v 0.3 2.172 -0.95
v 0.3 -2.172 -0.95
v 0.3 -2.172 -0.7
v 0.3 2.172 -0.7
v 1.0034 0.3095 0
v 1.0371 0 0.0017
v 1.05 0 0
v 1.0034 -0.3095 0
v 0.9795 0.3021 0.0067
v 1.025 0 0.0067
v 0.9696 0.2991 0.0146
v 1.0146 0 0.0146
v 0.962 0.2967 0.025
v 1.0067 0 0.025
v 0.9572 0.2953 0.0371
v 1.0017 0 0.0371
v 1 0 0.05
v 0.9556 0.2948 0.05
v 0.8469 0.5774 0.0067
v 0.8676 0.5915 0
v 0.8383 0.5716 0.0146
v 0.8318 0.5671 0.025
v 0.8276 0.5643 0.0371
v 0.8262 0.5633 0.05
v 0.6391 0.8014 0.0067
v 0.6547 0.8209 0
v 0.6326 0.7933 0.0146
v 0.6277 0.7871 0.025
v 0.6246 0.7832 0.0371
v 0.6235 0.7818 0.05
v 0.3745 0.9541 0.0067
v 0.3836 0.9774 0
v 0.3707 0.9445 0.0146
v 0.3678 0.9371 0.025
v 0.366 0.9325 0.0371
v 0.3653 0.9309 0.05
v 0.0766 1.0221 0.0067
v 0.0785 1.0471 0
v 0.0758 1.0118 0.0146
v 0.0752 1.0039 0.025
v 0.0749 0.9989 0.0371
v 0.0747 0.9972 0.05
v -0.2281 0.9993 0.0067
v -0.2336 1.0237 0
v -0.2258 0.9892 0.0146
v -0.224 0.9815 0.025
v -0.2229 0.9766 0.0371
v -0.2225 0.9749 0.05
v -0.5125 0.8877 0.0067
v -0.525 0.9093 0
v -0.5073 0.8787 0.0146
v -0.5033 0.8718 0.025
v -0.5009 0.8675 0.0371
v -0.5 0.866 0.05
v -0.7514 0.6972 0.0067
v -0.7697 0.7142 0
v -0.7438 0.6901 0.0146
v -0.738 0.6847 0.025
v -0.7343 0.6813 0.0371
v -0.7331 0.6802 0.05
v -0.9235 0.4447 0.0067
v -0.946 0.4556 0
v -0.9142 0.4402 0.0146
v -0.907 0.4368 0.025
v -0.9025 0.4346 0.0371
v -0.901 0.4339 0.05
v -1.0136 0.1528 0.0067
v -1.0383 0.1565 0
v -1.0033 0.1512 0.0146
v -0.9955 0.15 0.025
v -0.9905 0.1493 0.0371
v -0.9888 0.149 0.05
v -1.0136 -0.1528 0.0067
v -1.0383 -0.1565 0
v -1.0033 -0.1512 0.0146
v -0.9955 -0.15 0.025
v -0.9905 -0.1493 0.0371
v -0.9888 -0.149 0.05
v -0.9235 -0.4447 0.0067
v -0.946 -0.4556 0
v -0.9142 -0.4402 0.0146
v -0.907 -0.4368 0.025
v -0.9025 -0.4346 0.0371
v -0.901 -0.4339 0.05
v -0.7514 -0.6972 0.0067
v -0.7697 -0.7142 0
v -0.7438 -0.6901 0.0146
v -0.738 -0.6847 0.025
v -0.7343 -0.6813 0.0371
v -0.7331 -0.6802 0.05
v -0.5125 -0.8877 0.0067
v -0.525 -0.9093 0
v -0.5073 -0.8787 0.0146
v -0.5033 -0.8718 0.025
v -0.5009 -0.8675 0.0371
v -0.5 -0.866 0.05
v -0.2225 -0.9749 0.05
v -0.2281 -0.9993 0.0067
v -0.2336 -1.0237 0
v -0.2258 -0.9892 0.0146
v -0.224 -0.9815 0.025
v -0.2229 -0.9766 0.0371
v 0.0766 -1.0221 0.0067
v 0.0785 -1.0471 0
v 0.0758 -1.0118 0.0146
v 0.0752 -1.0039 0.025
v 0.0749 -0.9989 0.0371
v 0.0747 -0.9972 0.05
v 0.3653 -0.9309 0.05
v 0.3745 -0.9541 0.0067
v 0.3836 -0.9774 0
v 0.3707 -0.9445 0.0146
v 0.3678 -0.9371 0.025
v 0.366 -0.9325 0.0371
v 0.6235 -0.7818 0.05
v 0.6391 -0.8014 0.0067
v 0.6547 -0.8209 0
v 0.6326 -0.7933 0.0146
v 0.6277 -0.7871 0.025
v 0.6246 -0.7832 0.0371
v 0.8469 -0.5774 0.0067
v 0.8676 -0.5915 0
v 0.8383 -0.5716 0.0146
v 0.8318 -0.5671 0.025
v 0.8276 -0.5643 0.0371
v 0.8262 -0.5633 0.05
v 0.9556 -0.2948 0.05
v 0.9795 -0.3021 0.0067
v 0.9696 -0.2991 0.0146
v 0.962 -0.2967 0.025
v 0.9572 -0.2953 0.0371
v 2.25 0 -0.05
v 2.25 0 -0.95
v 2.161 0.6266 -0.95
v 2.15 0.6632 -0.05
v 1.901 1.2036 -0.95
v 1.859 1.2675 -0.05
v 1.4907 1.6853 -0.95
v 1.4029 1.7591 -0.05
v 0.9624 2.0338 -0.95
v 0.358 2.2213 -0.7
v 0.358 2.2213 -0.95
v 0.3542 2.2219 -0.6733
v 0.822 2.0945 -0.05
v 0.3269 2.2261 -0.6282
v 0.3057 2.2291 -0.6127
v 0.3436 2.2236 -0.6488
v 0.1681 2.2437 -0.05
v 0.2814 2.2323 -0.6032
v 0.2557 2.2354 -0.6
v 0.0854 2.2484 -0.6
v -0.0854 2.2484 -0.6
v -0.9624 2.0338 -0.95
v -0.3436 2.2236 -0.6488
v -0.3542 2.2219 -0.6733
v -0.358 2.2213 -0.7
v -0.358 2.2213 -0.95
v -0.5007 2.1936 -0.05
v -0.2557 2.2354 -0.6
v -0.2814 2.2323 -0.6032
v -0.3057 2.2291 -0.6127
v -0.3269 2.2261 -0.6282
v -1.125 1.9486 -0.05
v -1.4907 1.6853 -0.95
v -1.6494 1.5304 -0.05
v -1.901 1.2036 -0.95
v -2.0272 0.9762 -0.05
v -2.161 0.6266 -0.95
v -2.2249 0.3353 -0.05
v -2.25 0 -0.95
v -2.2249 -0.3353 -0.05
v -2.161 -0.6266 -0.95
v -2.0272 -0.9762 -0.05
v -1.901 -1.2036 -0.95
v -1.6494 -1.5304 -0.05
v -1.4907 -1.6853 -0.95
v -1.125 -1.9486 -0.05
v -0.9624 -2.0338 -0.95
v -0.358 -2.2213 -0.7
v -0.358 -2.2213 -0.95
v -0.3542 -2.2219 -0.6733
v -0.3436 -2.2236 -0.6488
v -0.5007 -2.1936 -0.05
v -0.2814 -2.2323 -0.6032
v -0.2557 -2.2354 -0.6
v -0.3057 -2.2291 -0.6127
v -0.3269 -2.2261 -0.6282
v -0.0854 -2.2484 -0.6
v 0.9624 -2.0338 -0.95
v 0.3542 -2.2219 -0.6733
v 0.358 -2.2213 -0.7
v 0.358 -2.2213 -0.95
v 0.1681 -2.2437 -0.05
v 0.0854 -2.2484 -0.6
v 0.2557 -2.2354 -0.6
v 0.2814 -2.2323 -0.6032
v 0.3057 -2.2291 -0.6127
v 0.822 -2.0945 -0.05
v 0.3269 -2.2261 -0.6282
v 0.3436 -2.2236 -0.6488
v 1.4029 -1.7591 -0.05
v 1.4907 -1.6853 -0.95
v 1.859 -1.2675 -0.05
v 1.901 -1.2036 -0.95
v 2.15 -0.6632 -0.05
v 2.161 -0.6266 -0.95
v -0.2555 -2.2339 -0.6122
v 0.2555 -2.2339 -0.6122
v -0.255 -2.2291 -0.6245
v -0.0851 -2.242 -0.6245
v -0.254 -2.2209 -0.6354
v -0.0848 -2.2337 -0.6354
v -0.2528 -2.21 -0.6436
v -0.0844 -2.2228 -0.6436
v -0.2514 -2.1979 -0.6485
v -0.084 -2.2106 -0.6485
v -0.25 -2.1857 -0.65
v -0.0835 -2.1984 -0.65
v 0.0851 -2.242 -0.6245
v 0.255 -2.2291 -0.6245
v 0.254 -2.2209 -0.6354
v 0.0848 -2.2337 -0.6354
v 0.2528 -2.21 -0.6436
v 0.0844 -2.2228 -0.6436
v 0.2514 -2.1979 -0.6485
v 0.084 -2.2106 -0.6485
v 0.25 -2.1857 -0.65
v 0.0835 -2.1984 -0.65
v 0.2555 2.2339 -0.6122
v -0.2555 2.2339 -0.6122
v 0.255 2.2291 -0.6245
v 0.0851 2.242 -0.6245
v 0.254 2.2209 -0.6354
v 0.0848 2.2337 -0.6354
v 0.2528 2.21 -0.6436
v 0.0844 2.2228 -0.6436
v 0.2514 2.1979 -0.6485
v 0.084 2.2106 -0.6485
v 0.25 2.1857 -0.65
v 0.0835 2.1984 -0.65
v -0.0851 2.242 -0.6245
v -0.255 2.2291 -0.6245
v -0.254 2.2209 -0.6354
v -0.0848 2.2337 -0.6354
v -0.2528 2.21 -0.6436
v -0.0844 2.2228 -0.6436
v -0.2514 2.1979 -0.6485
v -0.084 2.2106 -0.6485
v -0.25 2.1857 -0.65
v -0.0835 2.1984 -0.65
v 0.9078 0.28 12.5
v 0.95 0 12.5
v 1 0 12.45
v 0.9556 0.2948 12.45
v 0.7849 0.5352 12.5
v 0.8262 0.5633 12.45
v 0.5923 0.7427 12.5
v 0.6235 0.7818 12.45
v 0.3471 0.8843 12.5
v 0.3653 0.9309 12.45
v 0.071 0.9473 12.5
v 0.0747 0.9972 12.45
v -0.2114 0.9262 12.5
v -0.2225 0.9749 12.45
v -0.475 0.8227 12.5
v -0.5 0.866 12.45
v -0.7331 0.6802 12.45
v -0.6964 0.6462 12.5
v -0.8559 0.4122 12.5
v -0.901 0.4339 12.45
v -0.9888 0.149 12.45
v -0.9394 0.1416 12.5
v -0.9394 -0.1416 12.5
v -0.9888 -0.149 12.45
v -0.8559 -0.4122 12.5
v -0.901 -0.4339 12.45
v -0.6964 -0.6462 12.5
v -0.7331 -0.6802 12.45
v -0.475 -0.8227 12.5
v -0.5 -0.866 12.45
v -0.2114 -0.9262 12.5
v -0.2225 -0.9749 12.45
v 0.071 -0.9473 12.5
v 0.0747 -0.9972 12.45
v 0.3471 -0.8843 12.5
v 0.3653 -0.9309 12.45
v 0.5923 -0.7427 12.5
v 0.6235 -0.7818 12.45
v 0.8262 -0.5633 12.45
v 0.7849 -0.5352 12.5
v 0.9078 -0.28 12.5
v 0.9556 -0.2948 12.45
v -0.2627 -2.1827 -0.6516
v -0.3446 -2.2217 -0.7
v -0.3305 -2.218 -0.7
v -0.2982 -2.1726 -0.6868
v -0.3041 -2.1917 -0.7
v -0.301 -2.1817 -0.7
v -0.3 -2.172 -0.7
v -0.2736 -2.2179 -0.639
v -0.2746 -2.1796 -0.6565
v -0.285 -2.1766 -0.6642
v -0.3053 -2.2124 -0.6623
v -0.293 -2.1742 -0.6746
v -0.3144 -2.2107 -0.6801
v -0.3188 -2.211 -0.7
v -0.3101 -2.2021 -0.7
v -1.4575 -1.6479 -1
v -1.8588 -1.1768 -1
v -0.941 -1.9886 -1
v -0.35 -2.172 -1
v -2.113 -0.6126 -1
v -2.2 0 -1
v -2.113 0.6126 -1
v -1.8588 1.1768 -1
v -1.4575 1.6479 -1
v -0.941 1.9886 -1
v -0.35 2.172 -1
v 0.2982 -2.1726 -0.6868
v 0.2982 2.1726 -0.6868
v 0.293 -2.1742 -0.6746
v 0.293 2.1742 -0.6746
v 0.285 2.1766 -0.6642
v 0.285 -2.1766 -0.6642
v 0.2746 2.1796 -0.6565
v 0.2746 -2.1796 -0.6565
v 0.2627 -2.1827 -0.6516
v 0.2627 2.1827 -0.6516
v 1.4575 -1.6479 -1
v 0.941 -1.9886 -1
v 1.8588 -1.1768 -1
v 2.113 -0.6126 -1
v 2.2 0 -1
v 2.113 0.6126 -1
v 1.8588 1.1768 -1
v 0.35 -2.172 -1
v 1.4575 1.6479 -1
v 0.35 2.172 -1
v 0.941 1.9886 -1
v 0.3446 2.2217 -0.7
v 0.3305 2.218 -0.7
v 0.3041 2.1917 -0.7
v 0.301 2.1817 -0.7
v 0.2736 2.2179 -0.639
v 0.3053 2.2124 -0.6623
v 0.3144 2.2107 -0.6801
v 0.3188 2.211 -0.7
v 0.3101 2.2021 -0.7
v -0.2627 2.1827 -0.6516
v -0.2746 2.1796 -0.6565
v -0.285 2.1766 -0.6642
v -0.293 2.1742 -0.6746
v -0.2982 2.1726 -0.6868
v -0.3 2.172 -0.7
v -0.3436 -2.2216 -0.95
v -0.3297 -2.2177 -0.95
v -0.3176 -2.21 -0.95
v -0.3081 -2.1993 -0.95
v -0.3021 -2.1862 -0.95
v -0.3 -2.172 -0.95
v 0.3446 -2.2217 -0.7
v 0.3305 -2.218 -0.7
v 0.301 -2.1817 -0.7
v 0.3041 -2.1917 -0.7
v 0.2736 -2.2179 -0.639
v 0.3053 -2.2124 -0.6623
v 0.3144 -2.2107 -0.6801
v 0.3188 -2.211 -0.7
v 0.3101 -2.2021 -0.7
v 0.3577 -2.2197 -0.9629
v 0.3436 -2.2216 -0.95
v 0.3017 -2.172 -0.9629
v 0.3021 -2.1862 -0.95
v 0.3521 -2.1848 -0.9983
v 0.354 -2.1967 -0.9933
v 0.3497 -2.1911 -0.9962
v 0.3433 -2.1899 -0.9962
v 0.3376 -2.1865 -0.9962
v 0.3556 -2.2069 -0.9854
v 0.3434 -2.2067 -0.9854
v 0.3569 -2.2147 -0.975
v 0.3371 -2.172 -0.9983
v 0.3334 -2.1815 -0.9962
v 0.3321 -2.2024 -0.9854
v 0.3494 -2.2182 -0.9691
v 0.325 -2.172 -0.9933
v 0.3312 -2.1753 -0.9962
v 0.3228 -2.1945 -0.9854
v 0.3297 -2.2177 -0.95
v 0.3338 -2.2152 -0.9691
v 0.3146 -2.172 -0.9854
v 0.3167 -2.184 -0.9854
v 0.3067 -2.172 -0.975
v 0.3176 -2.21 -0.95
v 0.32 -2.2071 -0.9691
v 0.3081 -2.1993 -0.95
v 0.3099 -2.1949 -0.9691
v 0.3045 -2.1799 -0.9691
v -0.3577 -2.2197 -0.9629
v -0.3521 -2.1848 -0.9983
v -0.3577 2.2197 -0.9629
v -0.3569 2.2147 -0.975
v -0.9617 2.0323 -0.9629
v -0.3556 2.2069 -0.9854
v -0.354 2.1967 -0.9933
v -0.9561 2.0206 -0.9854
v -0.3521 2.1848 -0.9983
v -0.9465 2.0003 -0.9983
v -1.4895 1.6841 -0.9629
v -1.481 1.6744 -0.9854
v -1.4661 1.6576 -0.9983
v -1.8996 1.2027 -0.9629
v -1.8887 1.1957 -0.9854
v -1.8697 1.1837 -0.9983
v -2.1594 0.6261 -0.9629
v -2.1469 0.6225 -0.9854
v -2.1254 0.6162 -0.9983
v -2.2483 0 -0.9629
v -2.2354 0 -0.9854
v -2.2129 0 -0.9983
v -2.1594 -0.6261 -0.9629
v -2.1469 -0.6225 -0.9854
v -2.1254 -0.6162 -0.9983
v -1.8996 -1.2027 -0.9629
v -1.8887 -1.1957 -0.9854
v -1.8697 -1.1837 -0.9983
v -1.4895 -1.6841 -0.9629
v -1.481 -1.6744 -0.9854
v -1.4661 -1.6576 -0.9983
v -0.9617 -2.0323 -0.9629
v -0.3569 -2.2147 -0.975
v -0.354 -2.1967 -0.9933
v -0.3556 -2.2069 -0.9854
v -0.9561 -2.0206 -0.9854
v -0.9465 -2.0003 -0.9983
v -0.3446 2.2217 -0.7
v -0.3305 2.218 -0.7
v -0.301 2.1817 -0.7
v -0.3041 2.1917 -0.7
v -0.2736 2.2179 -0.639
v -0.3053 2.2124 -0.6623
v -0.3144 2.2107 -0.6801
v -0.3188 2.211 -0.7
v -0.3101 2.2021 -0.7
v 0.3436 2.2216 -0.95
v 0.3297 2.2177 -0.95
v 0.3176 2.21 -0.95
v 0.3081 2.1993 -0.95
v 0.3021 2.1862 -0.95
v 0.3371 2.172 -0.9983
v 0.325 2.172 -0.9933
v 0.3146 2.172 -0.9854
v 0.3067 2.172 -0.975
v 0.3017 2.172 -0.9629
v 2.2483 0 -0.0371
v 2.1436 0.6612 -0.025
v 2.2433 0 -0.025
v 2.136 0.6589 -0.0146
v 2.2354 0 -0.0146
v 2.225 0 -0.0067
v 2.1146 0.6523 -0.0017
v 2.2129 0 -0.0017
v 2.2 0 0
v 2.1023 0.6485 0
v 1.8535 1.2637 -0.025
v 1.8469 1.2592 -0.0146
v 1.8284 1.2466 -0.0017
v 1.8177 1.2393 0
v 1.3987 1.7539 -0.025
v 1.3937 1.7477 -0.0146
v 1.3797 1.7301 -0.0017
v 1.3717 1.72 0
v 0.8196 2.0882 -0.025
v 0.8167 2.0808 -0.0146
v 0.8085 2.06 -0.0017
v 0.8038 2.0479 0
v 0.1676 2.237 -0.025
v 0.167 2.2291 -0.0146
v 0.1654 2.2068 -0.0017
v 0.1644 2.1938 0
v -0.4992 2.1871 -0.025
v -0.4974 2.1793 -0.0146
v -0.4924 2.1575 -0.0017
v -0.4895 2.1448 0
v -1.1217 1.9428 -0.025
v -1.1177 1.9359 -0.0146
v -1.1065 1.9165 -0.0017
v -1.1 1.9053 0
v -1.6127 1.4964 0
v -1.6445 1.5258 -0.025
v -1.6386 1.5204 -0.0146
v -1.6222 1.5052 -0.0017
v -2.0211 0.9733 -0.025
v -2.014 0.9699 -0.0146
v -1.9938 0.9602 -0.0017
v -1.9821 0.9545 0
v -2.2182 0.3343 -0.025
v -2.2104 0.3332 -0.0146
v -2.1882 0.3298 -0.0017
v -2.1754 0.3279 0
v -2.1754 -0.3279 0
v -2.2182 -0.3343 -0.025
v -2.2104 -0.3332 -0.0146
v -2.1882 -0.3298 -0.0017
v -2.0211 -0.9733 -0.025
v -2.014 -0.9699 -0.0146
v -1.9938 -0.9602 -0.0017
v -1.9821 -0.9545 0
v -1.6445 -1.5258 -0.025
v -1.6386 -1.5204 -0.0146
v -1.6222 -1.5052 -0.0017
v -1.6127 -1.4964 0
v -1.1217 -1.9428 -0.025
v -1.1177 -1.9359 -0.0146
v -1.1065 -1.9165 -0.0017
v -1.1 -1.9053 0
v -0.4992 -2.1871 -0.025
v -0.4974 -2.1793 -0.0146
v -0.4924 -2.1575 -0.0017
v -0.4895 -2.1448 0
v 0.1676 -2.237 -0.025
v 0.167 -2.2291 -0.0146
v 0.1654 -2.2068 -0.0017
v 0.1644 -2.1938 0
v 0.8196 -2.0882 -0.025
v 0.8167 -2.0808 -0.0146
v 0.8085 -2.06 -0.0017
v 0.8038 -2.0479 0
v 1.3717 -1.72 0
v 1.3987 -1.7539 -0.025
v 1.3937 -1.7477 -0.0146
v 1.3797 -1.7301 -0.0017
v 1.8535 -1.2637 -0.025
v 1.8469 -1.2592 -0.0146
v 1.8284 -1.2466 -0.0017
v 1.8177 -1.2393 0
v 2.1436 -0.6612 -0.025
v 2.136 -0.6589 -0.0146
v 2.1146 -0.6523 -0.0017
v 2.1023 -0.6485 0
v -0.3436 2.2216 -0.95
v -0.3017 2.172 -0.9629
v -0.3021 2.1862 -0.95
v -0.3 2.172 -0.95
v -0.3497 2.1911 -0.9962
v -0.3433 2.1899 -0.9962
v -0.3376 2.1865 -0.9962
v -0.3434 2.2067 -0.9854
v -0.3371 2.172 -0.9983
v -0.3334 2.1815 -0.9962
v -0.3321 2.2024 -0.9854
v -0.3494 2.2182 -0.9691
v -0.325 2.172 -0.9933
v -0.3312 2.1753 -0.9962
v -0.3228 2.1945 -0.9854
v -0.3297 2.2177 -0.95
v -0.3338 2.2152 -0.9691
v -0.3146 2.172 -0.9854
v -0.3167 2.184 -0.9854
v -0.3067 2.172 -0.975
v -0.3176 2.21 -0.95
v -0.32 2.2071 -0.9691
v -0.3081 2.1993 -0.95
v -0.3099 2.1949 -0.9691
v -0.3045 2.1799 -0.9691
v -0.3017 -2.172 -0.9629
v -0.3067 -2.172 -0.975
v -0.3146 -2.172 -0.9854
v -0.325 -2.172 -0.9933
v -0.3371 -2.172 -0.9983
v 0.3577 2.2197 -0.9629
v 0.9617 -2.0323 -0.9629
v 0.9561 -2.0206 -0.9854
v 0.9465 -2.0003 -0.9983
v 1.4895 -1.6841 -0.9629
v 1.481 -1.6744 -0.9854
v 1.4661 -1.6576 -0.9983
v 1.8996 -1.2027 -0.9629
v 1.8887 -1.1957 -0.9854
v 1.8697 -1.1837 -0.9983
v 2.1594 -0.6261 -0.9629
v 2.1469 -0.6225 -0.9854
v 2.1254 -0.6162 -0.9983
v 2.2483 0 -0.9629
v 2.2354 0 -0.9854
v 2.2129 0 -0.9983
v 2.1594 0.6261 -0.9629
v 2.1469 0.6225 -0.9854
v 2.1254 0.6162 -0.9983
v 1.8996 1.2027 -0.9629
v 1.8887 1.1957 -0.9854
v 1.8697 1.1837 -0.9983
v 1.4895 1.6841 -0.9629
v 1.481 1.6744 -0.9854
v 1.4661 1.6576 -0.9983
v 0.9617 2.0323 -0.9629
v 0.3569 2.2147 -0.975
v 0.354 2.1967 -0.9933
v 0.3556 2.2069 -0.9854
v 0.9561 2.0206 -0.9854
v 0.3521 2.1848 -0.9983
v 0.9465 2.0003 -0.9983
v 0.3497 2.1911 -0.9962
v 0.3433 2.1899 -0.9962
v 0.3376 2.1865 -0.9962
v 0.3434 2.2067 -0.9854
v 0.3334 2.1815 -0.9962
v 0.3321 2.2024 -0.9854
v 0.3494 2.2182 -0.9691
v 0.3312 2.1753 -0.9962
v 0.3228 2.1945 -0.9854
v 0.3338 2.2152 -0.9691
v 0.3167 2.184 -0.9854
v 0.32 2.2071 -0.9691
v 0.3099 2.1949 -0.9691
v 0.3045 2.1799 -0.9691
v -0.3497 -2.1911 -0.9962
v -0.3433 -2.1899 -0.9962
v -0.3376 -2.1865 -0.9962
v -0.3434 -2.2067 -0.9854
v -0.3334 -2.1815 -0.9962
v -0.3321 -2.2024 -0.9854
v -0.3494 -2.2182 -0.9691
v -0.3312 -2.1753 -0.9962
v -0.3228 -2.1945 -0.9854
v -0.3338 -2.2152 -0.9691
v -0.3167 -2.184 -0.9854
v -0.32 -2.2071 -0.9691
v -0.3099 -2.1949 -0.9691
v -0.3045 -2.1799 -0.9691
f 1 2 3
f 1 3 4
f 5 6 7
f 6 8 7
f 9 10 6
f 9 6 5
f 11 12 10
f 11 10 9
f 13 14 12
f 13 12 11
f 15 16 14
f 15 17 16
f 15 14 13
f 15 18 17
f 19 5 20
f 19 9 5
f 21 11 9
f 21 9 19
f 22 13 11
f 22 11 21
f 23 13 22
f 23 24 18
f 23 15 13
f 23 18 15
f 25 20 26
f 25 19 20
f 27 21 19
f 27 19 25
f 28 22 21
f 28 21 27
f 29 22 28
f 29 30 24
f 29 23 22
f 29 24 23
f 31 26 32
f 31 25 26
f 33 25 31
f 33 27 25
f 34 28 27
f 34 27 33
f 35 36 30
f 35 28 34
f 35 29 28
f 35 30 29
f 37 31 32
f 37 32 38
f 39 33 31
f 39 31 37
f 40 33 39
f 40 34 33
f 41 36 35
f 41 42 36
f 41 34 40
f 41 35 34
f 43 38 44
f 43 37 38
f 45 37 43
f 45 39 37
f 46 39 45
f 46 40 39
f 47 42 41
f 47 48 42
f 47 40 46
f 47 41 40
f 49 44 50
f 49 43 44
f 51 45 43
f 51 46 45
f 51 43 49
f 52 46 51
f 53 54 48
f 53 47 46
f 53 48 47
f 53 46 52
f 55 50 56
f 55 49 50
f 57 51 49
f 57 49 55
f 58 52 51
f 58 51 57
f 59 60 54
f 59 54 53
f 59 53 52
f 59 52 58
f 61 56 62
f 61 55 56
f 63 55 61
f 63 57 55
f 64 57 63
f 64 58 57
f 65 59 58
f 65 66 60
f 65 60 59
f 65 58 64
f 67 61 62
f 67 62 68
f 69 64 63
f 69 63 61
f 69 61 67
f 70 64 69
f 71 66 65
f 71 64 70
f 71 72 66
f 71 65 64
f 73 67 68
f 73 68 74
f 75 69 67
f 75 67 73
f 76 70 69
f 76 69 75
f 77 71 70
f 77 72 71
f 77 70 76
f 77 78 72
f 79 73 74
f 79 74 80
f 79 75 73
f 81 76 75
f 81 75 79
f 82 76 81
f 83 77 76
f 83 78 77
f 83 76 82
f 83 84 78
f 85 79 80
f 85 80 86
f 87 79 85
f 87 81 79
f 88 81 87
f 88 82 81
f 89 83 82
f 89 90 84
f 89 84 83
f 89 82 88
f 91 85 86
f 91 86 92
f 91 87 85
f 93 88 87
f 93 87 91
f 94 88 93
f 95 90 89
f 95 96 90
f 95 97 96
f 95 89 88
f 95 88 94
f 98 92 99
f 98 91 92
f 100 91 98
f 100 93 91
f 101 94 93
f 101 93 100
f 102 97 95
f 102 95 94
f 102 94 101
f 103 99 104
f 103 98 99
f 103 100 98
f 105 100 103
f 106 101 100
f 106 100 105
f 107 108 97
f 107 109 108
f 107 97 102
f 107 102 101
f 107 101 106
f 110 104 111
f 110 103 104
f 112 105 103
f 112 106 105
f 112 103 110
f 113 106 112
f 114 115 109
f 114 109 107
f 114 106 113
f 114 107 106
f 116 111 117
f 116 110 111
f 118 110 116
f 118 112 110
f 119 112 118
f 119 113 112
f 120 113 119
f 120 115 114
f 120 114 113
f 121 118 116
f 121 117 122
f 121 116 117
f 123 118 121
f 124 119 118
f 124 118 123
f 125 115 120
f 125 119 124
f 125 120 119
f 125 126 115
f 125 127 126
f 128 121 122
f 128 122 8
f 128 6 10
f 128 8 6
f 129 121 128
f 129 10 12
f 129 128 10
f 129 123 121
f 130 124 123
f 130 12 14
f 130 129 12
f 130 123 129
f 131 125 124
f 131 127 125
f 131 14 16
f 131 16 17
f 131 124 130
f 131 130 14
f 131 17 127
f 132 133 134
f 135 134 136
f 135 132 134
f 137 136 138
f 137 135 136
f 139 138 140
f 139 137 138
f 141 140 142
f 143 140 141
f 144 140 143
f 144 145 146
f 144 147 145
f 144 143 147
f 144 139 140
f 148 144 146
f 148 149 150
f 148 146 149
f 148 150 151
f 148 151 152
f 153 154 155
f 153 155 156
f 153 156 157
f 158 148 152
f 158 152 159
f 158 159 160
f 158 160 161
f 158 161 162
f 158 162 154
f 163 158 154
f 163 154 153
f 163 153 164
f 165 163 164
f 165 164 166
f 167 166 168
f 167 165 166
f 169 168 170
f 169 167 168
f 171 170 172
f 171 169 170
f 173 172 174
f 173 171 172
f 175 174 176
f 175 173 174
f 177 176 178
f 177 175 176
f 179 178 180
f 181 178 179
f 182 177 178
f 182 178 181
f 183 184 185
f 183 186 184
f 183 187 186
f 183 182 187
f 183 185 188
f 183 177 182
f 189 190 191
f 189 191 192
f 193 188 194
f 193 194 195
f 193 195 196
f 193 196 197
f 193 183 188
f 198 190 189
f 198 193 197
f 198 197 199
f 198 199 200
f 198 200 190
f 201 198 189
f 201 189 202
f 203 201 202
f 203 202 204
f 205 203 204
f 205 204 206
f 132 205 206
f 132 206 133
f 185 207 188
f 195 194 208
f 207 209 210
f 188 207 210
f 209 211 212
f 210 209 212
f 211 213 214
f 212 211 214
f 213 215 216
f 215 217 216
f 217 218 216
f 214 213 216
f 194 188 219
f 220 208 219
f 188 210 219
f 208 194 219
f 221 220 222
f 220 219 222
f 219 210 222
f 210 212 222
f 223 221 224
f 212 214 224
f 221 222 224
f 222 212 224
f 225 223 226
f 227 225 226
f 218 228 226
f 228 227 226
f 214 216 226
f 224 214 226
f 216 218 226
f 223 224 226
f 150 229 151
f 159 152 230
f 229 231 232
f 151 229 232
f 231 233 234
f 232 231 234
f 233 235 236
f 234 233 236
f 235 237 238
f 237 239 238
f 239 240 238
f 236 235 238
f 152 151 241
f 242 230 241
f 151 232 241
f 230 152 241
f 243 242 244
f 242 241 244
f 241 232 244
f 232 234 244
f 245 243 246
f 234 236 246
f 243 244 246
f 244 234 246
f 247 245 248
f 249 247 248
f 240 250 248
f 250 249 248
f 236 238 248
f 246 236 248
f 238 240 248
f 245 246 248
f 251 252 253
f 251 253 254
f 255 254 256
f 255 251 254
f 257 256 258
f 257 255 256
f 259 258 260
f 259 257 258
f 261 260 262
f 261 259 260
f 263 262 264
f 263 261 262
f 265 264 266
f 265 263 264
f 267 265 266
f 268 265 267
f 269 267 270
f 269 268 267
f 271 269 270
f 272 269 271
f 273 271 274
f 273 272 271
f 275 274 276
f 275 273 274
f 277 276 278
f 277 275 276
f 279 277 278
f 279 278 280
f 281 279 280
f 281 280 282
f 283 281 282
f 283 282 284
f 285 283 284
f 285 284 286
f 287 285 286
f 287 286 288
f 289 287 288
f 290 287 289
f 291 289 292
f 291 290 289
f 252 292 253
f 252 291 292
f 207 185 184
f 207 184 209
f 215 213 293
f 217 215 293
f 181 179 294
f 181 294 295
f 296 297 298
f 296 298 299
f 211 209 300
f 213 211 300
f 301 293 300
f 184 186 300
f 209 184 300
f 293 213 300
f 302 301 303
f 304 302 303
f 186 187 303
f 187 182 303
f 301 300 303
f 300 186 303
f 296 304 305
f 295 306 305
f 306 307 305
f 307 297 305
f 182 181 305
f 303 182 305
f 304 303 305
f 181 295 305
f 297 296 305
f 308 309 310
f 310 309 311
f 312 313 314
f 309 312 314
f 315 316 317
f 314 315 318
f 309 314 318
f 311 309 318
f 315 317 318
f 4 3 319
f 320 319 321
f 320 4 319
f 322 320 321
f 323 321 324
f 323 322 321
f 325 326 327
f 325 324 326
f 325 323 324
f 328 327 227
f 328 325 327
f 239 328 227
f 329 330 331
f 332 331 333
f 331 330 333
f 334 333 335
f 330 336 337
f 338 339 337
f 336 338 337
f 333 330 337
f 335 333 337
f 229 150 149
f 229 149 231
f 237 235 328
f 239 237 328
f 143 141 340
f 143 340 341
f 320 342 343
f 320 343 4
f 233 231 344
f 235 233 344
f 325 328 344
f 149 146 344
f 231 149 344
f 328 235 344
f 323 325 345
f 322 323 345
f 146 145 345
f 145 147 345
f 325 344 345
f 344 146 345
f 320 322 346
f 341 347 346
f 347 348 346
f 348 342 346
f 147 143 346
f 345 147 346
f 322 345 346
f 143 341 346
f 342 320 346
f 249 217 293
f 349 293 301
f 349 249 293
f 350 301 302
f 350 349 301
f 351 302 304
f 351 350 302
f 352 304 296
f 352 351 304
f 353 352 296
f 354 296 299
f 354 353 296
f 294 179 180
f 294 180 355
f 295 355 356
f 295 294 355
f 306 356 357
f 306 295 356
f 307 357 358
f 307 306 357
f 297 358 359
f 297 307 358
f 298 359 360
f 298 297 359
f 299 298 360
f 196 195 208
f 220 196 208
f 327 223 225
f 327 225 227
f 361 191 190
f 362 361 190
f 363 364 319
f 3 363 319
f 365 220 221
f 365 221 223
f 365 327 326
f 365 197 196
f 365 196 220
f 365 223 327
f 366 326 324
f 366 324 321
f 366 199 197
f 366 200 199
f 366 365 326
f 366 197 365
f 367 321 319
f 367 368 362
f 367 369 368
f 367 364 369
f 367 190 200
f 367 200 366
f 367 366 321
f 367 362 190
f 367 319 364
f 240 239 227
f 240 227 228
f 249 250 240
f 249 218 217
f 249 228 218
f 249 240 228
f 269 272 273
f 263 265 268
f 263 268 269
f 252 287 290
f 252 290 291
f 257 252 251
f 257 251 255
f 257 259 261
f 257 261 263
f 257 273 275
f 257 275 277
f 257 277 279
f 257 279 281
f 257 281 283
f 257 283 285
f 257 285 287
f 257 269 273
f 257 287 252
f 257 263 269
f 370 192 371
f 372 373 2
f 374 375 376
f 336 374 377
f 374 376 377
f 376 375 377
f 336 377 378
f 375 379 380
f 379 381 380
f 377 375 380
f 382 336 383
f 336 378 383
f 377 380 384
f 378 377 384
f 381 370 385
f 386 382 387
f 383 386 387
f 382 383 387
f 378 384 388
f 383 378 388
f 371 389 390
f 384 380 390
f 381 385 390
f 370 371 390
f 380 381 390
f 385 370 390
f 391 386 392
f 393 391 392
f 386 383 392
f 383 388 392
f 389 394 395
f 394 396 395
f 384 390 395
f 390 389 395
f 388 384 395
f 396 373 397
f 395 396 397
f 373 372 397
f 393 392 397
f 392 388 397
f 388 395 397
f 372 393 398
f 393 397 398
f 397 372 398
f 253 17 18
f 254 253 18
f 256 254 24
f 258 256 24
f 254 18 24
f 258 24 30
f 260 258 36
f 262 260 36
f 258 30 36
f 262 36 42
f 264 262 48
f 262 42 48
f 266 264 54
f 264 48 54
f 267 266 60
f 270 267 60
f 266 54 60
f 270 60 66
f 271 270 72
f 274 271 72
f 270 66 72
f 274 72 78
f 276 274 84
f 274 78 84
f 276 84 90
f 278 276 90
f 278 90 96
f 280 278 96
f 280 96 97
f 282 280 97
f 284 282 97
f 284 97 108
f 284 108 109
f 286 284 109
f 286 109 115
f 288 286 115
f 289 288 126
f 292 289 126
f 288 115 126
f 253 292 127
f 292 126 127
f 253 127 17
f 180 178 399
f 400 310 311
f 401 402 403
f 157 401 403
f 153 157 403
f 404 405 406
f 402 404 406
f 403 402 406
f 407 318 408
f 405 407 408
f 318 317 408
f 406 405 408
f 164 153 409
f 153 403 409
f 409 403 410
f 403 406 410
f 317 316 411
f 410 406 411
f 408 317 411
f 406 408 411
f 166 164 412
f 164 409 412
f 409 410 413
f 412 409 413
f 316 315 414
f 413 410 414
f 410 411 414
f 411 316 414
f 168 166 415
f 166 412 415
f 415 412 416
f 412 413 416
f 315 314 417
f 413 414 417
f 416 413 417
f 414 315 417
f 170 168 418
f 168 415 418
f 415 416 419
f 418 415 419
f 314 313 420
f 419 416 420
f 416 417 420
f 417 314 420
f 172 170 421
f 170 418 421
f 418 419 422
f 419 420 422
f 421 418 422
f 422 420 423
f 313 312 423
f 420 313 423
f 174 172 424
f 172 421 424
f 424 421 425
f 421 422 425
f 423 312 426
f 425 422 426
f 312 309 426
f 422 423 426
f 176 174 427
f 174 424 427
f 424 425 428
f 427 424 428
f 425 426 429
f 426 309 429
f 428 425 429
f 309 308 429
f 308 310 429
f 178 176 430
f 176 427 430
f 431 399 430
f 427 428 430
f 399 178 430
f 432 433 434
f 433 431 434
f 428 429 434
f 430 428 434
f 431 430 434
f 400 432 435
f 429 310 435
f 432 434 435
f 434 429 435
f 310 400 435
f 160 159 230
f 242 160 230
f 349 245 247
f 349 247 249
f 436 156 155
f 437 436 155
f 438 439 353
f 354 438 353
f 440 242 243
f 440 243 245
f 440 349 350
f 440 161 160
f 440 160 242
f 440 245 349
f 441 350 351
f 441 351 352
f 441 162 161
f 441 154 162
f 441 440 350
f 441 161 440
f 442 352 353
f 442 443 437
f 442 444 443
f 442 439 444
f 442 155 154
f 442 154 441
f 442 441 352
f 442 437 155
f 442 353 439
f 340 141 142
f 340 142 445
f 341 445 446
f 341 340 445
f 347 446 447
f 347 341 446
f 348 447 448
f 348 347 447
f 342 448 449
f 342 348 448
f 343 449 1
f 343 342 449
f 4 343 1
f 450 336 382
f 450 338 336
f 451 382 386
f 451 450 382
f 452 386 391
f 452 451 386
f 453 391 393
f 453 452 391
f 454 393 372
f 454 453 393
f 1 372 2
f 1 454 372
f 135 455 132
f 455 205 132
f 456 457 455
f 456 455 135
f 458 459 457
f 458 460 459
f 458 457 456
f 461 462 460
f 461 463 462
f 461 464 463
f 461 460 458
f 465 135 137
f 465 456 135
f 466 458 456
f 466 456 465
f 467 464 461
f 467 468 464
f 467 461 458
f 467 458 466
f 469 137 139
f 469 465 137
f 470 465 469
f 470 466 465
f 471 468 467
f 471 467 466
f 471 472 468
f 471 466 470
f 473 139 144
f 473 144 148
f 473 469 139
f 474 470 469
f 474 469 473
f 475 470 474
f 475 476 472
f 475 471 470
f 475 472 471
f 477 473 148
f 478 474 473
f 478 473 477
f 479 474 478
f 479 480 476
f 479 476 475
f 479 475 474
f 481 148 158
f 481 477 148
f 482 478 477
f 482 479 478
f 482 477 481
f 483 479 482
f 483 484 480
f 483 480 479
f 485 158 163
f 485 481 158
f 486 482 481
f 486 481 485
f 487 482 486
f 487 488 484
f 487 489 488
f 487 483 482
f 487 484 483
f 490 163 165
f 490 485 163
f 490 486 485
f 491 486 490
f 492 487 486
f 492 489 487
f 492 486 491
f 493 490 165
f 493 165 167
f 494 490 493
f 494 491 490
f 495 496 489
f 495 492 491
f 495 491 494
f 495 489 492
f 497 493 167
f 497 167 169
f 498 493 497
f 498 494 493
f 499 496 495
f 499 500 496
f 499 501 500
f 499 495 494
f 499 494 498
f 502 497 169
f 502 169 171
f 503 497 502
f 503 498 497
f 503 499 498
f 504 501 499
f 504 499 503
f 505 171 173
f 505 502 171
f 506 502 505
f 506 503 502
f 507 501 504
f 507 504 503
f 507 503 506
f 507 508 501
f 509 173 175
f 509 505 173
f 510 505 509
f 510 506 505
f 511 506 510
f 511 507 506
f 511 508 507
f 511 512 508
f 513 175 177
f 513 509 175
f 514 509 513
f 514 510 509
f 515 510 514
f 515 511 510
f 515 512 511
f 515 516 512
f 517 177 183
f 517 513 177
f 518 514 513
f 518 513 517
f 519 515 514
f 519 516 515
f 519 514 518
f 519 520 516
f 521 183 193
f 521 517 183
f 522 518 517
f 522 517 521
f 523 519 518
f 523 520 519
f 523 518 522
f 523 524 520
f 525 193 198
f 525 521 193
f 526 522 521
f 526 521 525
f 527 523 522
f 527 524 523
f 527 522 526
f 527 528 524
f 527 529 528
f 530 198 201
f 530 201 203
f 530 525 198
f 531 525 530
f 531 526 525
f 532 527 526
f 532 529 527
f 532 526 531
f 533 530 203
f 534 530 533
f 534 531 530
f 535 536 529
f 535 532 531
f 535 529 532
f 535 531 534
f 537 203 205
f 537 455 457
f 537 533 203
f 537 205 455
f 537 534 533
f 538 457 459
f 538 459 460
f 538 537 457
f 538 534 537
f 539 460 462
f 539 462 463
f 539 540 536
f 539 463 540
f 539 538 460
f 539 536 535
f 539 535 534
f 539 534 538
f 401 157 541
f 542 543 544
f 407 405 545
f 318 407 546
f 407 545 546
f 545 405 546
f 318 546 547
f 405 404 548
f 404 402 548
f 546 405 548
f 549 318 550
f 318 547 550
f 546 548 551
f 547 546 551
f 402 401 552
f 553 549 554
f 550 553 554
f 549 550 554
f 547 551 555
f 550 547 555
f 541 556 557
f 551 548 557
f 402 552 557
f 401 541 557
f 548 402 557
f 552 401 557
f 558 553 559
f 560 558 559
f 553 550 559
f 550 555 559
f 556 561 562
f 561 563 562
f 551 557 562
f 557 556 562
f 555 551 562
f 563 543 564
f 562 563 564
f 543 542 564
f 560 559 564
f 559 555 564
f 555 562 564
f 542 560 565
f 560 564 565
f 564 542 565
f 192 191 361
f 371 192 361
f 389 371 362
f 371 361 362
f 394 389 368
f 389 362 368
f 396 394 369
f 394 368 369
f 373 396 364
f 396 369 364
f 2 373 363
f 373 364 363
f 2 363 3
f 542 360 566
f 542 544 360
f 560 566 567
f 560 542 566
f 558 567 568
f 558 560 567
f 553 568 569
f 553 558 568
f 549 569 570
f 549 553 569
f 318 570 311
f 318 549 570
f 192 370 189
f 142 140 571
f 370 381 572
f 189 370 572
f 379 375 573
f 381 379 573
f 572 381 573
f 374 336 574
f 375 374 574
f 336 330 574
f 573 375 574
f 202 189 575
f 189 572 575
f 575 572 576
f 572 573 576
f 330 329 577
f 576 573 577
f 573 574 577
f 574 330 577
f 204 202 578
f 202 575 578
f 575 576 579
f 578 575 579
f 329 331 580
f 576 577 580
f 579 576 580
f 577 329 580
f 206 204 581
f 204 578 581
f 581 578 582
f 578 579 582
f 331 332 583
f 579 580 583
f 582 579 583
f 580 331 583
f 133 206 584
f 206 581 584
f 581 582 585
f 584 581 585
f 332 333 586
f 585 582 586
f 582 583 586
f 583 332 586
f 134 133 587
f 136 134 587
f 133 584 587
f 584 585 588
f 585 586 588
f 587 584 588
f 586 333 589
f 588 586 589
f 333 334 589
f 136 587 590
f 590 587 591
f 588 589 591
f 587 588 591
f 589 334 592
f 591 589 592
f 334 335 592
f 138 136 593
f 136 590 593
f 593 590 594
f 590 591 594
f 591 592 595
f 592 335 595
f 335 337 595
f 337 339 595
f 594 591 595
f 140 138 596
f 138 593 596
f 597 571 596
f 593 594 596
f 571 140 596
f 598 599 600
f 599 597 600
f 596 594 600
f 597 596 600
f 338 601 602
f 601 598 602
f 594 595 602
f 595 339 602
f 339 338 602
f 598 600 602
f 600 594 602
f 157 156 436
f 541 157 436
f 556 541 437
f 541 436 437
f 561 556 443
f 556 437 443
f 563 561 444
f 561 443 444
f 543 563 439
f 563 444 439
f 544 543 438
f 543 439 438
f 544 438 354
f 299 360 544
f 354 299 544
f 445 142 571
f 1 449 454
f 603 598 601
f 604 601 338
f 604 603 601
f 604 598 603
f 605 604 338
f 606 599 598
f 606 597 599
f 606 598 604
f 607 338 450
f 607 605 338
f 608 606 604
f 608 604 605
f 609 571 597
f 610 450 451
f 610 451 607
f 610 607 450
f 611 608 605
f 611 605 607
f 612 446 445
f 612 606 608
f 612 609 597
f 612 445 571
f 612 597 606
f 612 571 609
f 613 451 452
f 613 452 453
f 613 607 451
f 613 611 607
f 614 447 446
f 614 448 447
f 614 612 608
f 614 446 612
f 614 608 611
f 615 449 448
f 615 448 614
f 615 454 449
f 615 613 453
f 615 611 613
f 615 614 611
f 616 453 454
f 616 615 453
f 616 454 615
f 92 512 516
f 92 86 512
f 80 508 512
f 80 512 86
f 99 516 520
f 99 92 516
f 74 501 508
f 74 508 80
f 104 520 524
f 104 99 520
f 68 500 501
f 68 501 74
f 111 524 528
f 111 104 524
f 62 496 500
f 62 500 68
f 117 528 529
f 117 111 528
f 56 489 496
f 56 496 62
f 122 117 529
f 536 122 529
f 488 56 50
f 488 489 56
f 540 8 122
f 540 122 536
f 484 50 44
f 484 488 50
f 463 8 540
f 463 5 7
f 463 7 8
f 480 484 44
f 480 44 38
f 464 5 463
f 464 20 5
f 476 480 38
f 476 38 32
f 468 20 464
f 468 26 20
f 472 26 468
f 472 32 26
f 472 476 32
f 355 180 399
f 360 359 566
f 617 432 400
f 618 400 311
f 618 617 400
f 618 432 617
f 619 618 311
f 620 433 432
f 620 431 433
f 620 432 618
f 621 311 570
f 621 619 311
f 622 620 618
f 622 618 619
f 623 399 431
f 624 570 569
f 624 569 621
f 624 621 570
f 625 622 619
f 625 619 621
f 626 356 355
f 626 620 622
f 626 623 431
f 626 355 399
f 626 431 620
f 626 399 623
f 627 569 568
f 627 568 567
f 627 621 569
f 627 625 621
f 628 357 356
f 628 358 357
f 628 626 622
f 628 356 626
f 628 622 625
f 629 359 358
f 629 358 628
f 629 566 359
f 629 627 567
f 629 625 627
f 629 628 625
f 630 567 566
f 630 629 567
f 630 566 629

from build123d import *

# Parameters (mm, degrees)
SKETCH1_R           = 1
BOSS_EXTRUDE1_DEPTH = 12.5
SKETCH2_R           = 2.25
BOSS_EXTRUDE2_DEPTH = 1
SKETCH3_W           = 0.6
SKETCH3_H           = 8.393754192
CUT_EXTRUDE1_DEPTH  = 0.35
FILLET1_R           = 0.05
FILLET2_R           = 0.05
CHAMFER1_SIZE       = 0.05


with BuildPart() as part:
    # Sketch1 → Boss-Extrude1 (new body)
    with BuildSketch(Plane.XY):
        Circle(SKETCH1_R)
    extrude(amount=BOSS_EXTRUDE1_DEPTH)

    # Sketch2 → Boss-Extrude2 (add)
    with BuildSketch(Plane.XY):
        Circle(SKETCH2_R)
    extrude(amount=-BOSS_EXTRUDE2_DEPTH)

    # Sketch3 → Cut-Extrude1 (cut)
    with BuildSketch(Plane(origin=(0, 0, -1), x_dir=(-1, 0, 0), z_dir=(0, 0, -1))):
        Rectangle(SKETCH3_W, SKETCH3_H)
    extrude(amount=-CUT_EXTRUDE1_DEPTH, mode=Mode.SUBTRACT)

    # Fillet1
    fillet1_edges = [part.edges().sort_by_distance(p)[0] for p in [
        (-2.25, 0, -1),
        (1.693738469, -1.481131324, -1),
        (0.3, 0, -1),
        (-0.3, 0, -1),
        (0, 2.25, -0.65),
        (0, -2.25, -0.65),
        (-0.3, -2.229910312, -0.825),
        (-0.3, 2.229910312, -0.825),
        (0.3, 2.229910312, -0.825),
        (0.3, -2.229910312, -0.825),
        (-0.3, 0, -0.65),
        (0.3, 0, -0.65),
        (-1, 0, 0),
    ]]
    fillet(fillet1_edges, radius=FILLET1_R)

    # Fillet2
    fillet2_edges = [part.edges().sort_by_distance(p)[0] for p in [
        (-2.25, 0, 0),
    ]]
    fillet(fillet2_edges, radius=FILLET2_R)

    # Chamfer1
    chamfer1_edges = [part.edges().sort_by_distance(p)[0] for p in [
        (-1, 0, 12.5),
    ]]
    chamfer(chamfer1_edges, length=CHAMFER1_SIZE)


solid = part.part
